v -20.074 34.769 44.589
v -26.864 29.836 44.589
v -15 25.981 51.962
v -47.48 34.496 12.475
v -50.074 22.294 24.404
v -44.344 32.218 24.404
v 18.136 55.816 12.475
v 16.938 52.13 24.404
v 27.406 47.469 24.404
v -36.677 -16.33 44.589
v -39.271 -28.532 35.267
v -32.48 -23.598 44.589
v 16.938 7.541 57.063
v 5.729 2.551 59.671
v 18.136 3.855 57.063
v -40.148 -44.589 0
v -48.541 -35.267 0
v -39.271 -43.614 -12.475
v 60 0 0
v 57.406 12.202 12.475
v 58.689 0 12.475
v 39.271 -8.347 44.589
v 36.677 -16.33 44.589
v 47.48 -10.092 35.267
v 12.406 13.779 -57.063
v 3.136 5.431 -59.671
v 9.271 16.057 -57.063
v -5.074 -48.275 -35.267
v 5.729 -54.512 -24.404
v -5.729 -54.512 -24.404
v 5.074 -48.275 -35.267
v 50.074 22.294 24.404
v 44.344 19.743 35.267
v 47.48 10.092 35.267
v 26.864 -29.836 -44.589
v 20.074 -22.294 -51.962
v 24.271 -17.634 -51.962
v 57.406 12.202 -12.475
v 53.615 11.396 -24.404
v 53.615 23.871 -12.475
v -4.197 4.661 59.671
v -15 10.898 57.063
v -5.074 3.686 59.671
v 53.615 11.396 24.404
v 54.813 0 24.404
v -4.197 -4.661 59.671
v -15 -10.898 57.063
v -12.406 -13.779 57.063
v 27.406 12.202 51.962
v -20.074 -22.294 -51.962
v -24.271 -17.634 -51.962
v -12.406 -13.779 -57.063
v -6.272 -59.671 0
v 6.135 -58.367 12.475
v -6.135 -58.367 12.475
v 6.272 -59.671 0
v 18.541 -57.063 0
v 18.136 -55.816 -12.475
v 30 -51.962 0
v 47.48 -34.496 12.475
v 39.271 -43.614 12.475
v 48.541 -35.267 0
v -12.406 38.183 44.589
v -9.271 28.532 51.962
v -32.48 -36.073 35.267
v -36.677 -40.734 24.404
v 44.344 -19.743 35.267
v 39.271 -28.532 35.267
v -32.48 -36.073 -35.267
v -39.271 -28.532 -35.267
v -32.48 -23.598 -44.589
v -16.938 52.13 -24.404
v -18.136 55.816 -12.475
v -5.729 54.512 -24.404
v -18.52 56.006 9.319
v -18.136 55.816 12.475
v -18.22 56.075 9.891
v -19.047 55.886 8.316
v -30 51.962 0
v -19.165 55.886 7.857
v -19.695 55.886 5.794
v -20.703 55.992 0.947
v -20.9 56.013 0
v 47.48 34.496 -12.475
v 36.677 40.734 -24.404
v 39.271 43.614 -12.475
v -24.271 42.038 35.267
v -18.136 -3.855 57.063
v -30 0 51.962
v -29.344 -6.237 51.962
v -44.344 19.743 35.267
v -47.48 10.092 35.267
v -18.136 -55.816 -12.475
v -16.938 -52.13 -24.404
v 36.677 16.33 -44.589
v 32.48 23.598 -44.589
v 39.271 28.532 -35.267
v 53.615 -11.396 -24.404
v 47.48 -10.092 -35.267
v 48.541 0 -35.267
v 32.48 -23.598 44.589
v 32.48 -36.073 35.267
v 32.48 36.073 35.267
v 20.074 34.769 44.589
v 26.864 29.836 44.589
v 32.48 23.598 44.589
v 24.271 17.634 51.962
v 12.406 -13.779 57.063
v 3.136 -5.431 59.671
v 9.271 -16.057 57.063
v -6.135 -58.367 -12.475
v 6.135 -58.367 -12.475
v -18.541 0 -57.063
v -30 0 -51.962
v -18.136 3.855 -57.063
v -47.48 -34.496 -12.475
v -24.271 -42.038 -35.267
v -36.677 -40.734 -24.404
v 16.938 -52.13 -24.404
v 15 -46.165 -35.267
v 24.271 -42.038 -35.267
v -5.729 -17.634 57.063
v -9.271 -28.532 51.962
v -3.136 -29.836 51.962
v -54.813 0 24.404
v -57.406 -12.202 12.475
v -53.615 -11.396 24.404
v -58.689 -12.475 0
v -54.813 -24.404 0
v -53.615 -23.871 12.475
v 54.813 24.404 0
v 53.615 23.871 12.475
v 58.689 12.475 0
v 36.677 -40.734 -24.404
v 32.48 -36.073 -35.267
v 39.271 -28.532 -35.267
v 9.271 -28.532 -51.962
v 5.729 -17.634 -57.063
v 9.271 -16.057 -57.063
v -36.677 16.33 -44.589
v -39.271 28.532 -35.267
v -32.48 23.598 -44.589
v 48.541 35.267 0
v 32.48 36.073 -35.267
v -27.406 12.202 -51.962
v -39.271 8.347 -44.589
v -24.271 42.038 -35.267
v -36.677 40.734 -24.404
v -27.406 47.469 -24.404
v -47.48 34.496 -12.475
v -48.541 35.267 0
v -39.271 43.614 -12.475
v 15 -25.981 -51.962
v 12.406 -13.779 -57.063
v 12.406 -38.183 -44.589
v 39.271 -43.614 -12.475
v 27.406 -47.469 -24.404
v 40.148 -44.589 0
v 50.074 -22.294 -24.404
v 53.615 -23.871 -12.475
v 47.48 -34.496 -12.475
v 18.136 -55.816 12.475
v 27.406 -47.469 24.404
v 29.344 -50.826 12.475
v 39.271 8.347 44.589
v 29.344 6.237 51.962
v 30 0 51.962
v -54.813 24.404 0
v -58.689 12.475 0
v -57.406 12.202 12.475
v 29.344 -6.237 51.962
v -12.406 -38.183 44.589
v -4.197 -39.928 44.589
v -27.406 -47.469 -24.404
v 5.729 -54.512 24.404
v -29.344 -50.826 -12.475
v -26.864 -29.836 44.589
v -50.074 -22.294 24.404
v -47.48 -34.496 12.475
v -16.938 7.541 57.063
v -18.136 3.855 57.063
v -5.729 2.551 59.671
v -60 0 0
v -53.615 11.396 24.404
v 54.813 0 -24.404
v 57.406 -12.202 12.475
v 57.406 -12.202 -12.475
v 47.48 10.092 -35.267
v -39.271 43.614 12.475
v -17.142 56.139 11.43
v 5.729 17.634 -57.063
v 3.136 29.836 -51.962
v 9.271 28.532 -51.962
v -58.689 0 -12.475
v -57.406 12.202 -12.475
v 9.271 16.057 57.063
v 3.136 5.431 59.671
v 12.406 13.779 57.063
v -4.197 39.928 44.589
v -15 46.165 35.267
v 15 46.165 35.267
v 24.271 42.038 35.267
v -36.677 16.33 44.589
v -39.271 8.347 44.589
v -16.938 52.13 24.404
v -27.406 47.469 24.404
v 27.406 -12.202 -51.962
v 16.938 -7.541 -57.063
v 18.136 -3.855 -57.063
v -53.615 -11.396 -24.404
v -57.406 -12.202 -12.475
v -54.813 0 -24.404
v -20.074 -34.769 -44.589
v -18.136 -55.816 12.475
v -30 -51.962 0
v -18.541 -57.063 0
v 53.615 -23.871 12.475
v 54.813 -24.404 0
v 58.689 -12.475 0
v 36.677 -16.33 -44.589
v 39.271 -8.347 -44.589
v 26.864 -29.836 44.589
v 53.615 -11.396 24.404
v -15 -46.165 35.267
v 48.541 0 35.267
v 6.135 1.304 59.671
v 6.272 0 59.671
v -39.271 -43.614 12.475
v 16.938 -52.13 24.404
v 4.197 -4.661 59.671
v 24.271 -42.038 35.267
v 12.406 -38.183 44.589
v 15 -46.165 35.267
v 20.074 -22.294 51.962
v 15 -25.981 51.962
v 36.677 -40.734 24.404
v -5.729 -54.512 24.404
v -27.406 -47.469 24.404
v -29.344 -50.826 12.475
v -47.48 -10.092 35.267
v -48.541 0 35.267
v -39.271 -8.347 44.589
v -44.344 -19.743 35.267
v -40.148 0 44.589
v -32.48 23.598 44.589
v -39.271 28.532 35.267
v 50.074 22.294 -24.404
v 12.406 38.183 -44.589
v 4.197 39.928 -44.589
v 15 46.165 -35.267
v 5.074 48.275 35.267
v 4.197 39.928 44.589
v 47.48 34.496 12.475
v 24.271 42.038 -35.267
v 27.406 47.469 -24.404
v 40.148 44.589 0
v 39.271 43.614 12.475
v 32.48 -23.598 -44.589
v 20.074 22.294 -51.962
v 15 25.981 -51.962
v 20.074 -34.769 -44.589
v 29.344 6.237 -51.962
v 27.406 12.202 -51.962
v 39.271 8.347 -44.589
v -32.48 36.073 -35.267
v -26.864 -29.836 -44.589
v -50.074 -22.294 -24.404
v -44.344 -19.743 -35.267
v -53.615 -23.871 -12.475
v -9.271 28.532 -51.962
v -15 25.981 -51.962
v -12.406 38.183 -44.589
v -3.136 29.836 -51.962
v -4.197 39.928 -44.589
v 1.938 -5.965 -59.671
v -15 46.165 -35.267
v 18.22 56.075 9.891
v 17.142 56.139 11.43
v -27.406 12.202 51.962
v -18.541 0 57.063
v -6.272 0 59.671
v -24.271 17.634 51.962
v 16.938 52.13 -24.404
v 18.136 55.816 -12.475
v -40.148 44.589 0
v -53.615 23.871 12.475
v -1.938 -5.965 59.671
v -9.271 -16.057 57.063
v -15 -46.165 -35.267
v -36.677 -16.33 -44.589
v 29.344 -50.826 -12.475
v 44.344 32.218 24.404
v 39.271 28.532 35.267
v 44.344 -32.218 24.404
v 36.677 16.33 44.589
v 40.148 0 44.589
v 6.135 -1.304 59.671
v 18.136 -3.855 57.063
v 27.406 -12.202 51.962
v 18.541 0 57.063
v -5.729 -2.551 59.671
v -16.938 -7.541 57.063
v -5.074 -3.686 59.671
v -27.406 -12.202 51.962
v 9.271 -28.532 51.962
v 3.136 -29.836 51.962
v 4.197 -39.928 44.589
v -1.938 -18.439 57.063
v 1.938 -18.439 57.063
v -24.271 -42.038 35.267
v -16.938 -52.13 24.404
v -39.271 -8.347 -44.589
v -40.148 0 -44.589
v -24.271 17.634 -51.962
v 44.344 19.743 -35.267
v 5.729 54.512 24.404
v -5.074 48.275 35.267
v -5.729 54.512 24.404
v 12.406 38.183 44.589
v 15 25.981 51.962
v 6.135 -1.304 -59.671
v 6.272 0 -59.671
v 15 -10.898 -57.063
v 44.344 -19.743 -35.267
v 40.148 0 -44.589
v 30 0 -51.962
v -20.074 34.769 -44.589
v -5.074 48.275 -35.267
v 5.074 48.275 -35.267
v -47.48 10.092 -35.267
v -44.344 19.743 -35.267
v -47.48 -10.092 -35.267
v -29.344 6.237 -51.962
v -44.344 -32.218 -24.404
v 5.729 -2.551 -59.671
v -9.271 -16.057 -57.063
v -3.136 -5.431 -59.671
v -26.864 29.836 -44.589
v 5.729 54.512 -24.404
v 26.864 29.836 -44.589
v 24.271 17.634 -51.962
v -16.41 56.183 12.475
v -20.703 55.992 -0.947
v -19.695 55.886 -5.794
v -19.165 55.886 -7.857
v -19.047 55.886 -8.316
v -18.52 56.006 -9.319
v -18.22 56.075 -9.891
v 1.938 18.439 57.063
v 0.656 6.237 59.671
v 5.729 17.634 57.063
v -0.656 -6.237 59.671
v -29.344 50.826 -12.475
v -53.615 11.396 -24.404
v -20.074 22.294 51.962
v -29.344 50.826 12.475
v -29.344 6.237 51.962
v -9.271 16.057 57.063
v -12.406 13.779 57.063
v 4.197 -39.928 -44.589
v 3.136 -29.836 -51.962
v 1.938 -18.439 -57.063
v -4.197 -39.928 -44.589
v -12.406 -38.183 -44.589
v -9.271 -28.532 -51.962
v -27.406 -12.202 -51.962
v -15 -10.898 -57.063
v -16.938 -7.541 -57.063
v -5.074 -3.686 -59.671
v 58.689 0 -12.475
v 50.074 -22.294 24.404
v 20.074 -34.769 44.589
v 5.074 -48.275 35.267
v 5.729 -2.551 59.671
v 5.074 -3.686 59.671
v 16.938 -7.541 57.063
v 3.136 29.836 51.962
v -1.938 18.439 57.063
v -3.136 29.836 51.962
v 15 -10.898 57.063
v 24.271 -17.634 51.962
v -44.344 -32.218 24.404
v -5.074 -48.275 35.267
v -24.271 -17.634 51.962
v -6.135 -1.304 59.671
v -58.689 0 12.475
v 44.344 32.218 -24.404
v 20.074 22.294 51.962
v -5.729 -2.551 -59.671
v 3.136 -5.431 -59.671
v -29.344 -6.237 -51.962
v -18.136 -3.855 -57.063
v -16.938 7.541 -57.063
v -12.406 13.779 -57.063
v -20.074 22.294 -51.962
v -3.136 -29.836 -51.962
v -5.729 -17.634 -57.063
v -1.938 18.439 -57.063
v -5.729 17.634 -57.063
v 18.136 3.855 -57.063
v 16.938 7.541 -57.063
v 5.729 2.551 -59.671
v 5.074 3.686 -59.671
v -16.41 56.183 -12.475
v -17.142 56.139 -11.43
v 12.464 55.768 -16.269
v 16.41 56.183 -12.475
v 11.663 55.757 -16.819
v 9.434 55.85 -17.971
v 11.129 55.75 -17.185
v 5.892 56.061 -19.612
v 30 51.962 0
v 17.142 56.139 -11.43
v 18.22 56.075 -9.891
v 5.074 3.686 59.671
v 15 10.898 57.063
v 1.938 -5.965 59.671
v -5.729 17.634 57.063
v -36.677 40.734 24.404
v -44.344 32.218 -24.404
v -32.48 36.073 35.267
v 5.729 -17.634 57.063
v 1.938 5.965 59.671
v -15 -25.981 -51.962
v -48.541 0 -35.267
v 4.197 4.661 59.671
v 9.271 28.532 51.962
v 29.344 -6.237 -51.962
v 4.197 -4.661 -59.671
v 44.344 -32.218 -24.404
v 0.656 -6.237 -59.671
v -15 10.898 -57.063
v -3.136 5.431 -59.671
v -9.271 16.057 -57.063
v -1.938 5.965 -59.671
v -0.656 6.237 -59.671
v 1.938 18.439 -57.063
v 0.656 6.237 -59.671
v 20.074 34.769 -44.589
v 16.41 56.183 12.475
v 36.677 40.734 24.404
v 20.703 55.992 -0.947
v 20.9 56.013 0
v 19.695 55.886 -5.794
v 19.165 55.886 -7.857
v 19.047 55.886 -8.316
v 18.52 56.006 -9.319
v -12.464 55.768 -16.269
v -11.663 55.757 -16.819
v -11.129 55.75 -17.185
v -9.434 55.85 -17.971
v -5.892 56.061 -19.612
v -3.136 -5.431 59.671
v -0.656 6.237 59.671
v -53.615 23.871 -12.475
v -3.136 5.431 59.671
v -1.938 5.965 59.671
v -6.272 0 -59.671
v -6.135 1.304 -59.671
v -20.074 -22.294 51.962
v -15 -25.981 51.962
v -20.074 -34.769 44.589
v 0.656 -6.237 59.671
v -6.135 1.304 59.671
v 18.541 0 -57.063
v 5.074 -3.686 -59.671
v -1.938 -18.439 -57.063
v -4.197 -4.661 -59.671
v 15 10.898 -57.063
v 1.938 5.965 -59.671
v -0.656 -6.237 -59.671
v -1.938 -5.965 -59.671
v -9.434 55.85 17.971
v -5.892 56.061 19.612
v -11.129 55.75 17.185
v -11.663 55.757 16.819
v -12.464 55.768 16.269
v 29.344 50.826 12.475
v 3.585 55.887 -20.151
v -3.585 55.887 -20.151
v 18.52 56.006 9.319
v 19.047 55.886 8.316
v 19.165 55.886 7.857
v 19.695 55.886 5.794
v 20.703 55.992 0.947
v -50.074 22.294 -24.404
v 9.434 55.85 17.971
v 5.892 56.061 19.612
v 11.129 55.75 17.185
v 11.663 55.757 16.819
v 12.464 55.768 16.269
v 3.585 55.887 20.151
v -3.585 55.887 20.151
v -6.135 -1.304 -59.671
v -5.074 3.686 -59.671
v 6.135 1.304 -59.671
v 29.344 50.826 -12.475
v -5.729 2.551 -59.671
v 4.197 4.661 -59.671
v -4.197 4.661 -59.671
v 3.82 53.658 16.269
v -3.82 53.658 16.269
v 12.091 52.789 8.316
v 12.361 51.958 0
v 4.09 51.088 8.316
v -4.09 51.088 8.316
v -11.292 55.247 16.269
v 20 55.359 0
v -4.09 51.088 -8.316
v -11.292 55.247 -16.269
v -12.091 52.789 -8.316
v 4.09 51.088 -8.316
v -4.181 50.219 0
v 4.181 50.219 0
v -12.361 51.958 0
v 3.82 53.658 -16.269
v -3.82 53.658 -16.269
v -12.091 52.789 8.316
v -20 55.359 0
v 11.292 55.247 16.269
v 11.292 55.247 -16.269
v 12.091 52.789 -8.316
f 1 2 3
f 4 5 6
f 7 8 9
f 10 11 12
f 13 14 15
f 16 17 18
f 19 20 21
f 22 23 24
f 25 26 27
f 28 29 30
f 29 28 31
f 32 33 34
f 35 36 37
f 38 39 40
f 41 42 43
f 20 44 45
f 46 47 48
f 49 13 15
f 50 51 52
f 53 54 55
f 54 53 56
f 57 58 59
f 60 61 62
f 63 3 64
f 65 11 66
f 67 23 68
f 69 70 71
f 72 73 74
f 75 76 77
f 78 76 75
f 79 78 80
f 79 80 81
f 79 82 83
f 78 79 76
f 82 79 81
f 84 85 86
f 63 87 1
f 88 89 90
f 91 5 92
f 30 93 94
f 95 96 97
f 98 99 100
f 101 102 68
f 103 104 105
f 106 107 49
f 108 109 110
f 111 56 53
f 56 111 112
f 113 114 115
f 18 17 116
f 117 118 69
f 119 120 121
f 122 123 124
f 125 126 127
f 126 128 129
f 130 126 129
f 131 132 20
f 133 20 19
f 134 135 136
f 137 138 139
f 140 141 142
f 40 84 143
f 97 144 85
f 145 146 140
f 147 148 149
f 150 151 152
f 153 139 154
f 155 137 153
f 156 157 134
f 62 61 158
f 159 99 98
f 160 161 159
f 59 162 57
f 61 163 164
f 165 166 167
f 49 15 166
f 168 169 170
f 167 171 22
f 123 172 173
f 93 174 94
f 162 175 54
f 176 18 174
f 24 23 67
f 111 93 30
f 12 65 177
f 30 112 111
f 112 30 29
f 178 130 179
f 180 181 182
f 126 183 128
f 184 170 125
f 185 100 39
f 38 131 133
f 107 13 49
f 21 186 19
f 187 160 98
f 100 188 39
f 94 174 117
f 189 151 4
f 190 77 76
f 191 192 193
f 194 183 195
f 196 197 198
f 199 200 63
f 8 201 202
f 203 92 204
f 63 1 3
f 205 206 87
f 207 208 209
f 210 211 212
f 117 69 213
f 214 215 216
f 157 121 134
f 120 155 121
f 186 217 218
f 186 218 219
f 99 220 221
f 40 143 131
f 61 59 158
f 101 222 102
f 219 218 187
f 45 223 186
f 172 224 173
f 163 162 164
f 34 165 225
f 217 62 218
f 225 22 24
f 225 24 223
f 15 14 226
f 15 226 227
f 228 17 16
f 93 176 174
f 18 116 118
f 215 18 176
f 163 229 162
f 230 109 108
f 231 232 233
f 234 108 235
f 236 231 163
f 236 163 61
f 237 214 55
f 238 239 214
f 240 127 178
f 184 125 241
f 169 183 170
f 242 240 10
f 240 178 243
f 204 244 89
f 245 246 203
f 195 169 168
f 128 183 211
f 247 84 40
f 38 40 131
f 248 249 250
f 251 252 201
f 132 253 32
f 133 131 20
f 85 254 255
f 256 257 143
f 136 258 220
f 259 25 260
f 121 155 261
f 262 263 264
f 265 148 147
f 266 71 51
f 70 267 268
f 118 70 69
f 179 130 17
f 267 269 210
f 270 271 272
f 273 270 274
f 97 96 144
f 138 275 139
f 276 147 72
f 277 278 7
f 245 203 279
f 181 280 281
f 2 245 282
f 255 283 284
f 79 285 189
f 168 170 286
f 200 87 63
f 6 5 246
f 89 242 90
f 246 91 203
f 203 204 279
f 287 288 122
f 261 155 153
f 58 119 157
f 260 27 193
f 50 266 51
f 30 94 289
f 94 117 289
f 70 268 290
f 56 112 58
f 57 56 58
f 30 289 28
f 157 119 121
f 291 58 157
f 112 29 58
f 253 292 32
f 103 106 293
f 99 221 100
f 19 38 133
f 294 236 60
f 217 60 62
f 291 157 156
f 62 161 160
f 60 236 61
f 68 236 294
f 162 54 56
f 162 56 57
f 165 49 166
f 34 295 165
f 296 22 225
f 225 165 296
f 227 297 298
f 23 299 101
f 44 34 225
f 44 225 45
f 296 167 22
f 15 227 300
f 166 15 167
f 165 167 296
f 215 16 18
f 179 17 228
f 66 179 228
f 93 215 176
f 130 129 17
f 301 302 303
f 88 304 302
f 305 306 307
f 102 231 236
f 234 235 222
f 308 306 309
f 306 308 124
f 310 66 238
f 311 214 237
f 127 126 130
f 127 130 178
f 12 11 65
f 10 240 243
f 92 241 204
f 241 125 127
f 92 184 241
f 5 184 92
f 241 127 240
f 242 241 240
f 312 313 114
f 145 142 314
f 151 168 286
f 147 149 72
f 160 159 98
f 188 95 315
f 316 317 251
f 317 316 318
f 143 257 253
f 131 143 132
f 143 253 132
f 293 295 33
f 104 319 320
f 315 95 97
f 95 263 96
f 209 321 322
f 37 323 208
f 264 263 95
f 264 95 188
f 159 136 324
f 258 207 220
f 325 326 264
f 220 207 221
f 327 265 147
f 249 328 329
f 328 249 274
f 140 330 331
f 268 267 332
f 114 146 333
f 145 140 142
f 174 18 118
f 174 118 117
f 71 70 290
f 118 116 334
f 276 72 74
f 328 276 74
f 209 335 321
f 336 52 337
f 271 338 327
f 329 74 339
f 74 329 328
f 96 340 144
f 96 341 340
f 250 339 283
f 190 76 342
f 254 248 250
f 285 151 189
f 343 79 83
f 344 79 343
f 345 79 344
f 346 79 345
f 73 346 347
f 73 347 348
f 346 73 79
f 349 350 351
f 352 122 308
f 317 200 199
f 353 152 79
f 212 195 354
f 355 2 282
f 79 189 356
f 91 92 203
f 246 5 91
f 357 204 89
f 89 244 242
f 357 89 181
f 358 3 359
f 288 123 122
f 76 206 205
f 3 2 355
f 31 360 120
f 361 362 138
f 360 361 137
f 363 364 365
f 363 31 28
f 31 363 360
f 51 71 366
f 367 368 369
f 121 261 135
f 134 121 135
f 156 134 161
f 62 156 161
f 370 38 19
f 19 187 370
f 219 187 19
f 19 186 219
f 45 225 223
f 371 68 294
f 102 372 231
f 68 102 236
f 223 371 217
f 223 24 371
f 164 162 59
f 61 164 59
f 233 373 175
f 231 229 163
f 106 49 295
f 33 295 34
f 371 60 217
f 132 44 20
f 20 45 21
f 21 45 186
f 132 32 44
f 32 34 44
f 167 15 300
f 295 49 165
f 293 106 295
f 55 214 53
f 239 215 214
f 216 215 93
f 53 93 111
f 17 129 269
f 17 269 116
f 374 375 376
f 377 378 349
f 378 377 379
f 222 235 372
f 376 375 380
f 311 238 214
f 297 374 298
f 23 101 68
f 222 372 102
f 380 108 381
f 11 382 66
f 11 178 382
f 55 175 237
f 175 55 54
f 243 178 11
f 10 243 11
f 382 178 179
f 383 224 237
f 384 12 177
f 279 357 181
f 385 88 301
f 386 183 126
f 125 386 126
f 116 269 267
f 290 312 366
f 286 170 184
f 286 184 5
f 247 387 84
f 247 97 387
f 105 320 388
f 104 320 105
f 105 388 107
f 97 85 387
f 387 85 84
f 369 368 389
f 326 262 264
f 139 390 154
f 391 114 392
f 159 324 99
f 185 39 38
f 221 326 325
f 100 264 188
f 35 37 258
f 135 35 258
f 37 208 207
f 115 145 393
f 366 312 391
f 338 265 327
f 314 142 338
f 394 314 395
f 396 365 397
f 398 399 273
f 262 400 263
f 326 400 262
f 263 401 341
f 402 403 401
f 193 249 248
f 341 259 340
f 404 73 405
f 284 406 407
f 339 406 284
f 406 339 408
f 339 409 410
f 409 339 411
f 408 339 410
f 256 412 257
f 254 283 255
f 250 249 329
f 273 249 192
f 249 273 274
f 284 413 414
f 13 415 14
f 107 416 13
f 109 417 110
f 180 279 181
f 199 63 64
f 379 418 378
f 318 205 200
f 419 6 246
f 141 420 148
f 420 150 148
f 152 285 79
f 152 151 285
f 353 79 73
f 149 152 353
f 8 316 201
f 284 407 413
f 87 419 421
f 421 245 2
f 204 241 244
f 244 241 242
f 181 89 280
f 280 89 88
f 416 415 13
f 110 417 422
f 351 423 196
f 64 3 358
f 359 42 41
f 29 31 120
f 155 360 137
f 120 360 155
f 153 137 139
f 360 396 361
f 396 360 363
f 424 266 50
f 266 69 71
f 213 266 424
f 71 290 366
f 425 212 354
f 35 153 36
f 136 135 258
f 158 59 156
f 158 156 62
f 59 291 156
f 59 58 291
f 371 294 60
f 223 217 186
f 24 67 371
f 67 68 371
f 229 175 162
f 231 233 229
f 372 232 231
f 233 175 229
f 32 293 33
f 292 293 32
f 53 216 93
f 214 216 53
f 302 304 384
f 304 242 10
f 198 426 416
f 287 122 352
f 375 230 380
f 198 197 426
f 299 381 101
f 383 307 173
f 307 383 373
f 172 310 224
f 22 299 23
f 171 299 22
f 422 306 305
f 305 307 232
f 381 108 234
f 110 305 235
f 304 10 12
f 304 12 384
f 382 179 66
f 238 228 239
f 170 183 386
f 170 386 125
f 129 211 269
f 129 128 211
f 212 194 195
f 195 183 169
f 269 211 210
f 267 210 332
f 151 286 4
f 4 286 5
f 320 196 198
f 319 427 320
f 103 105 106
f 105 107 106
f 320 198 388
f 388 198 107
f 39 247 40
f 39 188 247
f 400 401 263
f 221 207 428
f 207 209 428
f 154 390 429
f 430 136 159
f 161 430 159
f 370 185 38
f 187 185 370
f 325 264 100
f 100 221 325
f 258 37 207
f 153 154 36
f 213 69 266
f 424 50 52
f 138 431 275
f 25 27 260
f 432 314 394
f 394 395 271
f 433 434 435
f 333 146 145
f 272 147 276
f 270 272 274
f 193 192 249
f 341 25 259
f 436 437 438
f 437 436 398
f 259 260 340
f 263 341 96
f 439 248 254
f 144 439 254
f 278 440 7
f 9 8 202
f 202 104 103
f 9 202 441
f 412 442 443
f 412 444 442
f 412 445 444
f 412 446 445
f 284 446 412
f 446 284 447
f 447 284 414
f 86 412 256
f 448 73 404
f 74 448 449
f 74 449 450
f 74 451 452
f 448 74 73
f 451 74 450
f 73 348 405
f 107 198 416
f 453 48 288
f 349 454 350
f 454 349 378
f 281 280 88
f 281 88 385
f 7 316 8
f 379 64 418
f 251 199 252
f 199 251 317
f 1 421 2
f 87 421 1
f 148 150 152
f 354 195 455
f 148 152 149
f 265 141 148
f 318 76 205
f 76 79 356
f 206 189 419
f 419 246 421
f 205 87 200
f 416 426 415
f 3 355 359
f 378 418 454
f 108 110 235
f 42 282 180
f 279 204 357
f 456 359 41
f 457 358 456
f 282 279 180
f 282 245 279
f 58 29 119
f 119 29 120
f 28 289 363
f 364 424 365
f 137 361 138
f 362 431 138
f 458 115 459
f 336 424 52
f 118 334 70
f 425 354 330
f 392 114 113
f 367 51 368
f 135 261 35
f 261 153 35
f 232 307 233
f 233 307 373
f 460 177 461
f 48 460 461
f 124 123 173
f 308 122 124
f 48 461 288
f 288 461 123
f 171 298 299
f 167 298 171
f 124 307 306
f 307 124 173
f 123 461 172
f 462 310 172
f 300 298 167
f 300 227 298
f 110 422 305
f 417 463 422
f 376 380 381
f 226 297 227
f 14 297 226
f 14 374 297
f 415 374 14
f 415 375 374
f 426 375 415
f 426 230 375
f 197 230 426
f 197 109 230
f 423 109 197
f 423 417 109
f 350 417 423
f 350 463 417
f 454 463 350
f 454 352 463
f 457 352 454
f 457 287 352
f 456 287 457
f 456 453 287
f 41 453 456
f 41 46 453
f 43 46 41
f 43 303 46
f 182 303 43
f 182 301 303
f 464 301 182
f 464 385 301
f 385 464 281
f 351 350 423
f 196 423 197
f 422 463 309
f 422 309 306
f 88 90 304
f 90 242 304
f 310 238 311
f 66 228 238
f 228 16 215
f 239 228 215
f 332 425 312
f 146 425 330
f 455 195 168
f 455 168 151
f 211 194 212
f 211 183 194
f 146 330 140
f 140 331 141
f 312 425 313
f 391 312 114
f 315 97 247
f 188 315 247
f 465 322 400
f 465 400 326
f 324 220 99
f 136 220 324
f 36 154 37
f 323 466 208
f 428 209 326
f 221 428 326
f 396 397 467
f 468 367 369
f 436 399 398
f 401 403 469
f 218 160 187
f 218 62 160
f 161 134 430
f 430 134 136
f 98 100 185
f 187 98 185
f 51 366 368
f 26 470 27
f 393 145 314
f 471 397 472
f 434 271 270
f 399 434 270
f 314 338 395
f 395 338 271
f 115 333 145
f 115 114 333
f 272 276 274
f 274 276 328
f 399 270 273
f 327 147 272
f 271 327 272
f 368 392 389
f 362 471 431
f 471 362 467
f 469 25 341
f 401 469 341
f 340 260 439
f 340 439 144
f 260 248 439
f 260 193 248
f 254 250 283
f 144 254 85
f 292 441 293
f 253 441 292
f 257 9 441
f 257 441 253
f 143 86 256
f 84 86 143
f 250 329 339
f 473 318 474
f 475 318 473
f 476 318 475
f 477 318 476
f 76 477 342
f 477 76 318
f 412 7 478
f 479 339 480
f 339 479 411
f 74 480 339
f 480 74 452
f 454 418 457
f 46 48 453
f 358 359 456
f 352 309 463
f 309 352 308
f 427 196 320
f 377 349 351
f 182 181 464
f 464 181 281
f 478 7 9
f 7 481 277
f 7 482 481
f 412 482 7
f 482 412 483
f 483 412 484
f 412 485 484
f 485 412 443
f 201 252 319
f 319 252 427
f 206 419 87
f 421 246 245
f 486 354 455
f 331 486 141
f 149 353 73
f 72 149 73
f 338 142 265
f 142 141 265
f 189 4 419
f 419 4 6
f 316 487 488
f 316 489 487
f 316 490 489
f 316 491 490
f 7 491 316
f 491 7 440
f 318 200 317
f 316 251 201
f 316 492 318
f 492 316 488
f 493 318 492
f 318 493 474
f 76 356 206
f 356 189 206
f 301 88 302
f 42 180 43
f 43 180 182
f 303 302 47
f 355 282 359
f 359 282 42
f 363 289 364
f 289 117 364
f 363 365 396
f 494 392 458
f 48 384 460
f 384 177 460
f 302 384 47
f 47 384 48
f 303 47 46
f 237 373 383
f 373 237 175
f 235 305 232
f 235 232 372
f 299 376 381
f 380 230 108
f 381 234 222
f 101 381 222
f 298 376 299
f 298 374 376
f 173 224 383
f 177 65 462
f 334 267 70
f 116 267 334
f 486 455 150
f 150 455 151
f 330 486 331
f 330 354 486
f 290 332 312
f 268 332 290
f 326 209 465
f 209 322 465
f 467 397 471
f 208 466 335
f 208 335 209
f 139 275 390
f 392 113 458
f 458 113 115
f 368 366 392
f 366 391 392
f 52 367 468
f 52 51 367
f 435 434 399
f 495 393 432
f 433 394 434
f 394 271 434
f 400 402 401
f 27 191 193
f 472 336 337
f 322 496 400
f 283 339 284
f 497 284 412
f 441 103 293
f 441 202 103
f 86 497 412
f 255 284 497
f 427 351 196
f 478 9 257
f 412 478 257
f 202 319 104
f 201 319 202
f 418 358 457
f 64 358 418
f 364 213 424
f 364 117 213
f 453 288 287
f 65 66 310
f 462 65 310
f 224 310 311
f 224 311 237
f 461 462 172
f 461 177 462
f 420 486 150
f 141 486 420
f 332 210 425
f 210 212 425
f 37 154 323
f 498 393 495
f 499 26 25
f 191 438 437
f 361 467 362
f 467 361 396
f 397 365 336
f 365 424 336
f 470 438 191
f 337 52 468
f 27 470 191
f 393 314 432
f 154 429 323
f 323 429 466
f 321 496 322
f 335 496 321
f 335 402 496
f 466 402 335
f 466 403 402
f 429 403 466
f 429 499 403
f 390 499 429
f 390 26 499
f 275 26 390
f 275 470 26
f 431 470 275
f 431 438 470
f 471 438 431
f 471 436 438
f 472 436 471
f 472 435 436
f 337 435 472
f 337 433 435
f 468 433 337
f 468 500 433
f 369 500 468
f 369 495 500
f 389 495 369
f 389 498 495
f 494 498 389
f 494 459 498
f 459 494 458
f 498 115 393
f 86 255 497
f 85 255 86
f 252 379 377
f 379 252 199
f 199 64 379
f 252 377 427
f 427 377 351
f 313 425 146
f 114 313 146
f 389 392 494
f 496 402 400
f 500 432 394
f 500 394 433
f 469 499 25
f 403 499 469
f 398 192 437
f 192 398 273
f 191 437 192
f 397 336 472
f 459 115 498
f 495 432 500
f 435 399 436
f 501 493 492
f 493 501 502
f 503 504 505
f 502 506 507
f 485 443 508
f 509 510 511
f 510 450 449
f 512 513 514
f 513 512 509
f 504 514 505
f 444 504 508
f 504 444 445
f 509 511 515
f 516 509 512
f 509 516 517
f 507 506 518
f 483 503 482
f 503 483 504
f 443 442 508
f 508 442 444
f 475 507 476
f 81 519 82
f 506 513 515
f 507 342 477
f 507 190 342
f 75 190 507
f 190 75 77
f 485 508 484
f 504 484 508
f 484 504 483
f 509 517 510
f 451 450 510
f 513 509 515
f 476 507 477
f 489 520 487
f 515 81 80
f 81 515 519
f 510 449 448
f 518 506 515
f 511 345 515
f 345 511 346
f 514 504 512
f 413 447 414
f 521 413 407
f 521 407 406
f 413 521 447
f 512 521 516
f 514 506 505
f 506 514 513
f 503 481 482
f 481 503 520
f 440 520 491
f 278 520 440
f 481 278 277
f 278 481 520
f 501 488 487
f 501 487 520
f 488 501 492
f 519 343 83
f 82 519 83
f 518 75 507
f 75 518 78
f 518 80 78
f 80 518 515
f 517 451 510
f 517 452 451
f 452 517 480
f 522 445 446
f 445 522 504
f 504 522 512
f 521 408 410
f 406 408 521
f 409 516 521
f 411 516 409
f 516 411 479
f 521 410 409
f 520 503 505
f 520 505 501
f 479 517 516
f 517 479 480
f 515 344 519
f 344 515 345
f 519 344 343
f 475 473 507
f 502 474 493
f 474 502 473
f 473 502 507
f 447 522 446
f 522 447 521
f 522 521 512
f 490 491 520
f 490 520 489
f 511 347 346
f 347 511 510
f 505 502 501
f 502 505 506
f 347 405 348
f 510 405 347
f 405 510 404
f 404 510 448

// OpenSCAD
// We are performing geometric subtraction

difference() {

  // Create the primary sphere of radius 60 centred at the origin

  translate(v = [0,0,0]) {
    sphere(60);
  }

  /*Subtract an overlapping sphere with a radius of 40
     The resultant hole will be smaller than this, because we only
     only catch the edge
  */

  translate(v = [0,90,0]) {
    sphere(40);
  }
}
